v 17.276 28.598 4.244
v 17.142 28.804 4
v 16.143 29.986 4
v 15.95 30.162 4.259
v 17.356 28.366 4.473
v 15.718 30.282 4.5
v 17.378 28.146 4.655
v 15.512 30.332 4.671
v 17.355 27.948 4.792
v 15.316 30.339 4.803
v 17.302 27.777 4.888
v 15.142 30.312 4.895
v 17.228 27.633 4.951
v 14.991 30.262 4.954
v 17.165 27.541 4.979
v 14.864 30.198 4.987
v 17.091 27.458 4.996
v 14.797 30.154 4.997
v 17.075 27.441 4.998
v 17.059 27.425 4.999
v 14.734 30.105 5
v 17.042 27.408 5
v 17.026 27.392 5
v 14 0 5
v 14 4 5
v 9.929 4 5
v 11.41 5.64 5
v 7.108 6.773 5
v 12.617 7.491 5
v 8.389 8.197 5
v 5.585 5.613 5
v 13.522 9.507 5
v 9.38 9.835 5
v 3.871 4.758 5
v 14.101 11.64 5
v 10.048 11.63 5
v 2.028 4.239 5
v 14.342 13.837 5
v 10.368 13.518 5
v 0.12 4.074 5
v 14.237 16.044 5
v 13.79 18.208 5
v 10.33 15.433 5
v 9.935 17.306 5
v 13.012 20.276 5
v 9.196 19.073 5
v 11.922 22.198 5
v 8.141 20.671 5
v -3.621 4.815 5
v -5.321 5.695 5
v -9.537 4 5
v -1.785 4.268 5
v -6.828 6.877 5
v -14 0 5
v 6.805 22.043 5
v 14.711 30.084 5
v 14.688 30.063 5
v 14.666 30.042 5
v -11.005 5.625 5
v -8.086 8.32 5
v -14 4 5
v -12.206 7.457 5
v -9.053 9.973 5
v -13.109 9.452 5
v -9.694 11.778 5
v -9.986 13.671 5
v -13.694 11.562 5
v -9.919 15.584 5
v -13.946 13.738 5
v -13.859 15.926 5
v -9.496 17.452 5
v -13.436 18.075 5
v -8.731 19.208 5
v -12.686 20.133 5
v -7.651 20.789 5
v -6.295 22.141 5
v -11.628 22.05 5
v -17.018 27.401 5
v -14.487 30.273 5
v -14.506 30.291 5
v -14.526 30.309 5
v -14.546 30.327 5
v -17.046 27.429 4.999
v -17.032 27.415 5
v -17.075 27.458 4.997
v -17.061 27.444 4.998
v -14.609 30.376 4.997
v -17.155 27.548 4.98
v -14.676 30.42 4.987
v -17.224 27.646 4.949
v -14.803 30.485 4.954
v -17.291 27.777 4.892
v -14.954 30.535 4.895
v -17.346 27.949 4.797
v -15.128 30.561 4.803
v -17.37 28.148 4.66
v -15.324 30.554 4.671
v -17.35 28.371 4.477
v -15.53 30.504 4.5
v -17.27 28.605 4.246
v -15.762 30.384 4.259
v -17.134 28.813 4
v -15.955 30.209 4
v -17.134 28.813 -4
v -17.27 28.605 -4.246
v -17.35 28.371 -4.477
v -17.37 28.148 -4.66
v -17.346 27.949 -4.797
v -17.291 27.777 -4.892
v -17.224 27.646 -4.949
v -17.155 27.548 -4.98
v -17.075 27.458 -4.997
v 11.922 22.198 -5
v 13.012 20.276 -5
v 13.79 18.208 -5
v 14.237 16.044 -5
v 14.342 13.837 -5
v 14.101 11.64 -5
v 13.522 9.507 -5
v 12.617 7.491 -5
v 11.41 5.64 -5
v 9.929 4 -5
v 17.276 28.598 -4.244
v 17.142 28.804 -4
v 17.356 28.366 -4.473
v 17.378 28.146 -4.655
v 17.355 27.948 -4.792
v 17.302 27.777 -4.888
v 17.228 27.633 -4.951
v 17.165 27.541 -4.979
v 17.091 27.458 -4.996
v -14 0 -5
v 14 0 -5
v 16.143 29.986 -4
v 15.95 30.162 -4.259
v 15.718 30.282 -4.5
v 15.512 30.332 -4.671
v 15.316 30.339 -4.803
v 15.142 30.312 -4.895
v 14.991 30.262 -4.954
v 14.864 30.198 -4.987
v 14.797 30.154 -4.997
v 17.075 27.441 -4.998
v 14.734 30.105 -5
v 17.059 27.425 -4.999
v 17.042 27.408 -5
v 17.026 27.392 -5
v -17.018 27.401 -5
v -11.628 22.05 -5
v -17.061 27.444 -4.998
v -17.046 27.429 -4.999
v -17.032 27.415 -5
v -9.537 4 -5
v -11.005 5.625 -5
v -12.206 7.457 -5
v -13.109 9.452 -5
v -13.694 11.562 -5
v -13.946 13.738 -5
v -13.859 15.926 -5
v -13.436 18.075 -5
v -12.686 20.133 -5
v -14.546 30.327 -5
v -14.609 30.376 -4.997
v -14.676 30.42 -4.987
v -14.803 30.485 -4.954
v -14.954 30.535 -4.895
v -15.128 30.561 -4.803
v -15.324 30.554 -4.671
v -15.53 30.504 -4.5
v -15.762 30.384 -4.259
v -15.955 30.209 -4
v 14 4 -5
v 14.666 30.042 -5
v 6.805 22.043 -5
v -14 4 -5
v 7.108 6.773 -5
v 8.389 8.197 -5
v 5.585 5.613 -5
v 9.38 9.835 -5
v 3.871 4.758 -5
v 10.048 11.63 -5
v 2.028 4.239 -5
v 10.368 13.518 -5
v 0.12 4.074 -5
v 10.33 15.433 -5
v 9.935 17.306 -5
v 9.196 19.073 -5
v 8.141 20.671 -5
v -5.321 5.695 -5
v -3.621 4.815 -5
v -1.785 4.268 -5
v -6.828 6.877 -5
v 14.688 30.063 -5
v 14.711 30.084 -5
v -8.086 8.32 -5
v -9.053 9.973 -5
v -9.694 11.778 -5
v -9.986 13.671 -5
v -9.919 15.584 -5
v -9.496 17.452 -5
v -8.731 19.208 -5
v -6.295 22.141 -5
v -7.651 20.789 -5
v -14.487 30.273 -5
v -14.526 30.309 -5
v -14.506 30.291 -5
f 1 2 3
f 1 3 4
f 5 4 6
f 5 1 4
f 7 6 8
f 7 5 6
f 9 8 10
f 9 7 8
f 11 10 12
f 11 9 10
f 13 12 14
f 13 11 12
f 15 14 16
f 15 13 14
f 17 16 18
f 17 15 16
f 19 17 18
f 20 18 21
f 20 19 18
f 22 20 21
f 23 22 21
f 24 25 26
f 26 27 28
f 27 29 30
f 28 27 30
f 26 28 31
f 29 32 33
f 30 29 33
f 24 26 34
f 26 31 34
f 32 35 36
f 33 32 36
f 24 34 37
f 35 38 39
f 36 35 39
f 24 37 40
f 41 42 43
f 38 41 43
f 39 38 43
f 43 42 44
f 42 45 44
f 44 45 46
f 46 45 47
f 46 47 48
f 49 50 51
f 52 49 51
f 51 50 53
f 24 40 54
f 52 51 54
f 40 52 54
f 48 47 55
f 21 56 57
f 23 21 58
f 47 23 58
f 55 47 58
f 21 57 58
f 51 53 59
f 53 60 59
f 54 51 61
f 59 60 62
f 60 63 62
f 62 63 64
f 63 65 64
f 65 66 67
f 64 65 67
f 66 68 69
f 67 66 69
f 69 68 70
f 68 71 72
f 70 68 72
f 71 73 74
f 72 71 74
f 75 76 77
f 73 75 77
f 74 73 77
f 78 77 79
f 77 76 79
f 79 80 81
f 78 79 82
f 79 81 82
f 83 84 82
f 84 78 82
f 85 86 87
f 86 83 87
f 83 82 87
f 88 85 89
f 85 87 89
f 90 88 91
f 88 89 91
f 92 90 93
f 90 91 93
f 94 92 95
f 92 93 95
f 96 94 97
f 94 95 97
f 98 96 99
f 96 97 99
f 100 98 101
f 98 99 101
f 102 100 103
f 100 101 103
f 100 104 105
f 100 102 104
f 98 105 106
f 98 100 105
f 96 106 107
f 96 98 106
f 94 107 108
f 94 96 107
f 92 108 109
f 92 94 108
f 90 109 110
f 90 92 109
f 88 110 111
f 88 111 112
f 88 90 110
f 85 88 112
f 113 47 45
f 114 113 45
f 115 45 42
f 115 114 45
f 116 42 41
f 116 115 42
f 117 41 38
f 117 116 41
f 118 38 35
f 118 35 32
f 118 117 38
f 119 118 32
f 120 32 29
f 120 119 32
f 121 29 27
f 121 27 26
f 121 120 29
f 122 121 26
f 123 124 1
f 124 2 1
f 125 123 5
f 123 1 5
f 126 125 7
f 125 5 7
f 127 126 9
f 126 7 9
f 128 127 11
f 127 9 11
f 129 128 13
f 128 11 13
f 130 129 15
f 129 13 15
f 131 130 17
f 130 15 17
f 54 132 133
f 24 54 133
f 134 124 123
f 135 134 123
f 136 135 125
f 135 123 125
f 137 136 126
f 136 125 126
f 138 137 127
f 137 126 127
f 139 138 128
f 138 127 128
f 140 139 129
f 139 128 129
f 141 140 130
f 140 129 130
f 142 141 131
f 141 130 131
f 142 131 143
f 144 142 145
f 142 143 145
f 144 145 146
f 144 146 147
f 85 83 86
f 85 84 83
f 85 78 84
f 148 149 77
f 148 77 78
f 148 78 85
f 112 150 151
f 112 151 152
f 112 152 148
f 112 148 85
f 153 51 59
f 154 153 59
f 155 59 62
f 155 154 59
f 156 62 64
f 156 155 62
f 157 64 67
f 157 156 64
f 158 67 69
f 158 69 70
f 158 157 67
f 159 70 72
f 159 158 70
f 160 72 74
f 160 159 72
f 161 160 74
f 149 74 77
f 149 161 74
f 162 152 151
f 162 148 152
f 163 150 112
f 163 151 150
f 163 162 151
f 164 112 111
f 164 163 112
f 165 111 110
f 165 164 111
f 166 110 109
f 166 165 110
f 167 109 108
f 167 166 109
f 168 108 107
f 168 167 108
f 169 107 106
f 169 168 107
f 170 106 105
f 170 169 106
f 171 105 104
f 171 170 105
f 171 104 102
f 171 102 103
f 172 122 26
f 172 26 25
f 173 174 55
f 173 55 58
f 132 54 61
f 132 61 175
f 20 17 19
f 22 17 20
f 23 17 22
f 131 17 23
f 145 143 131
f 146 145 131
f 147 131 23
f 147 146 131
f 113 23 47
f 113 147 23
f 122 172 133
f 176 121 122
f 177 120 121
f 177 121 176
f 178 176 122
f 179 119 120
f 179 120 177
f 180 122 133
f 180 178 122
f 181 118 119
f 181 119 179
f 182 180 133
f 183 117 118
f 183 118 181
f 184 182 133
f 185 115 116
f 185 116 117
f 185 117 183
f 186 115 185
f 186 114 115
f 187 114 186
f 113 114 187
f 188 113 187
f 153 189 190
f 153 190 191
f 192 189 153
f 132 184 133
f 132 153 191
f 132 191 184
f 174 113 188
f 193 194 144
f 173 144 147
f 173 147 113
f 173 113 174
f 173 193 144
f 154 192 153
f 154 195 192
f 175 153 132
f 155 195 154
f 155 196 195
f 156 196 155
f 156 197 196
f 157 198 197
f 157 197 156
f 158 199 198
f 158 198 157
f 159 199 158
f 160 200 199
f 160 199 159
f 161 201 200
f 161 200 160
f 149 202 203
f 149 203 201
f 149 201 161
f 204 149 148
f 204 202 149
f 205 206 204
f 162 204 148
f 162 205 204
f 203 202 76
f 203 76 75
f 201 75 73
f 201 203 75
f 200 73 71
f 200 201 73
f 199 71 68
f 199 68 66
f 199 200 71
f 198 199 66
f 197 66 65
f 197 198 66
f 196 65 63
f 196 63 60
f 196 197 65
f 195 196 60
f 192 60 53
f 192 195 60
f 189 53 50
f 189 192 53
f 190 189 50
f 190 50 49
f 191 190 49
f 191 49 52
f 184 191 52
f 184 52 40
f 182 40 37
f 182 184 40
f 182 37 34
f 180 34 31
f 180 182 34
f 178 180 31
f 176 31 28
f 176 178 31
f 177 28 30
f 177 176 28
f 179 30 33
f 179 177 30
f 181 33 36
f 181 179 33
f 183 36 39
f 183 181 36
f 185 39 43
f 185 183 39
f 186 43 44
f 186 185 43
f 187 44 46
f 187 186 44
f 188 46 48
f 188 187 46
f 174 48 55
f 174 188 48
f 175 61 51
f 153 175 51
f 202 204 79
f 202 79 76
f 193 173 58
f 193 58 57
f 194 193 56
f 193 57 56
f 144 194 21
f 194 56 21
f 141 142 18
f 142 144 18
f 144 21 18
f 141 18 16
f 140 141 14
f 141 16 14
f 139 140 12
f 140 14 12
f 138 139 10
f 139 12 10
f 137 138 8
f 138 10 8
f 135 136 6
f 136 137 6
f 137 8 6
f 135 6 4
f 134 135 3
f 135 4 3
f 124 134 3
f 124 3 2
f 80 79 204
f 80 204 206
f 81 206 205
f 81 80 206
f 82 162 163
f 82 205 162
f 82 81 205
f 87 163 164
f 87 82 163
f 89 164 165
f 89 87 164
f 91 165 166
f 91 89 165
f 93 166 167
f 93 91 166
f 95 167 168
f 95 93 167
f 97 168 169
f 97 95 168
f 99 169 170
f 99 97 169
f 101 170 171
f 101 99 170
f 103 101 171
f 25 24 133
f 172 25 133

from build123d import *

# Parameters (mm, degrees)
SKETCH1_W           = 28
SKETCH1_H           = 10
BOSS_EXTRUDE1_DEPTH = 4
BOSS_EXTRUDE2_START = -5
BOSS_EXTRUDE2_DEPTH = 10
FILLET3_R           = 1


with BuildPart() as part:
    # Sketch1 → Boss-Extrude1 (new body)
    with BuildSketch(Plane(origin=(0, 0, 0), x_dir=(1, 0, 0), z_dir=(0, 1, 0))):
        Rectangle(SKETCH1_W, SKETCH1_H)
    extrude(amount=BOSS_EXTRUDE1_DEPTH)

    # Sketch3 → Boss-Extrude2 (add)
    with BuildSketch(Plane.XY.offset(BOSS_EXTRUDE2_START)):
        with BuildLine():
            Line((6.804916492, 22.043099096), (15.434965947, 30.824064473))
            Line((15.434965947, 30.824064473), (17.72994071, 28.10787731))
            Line((17.72994071, 28.10787731), (11.921630408, 22.197995574))
            ThreePointArc((11.921630408, 22.197995574), (0.285107603, 0.121770207), (-11.627623737, 22.050181492))
            Line((-11.627623737, 22.050181492), (-17.72994071, 28.10787731))
            Line((-17.72994071, 28.10787731), (-15.255675803, 31.036260962))
            Line((-15.255675803, 31.036260962), (-6.295168075, 22.141273955))
            ThreePointArc((-6.295168075, 22.141273955), (0.119840794, 4.073834753), (6.804916492, 22.043099096))
        make_face()
    extrude(amount=BOSS_EXTRUDE2_DEPTH)

    # Fillet3
    fillet3_edges = [part.edges().sort_by_distance(p)[0] for p in [
        (16.582453328, 29.465970891, -5),
        (17.72994071, 28.10787731, 0),
        (15.434965947, 30.824064473, 0),
        (-16.492808256, 29.572069136, -5),
        (-15.255675803, 31.036260962, 0),
        (-17.72994071, 28.10787731, 0),
        (16.582453328, 29.465970891, 5),
        (-16.492808256, 29.572069136, 5),
    ]]
    fillet(fillet3_edges, radius=FILLET3_R)


solid = part.part
